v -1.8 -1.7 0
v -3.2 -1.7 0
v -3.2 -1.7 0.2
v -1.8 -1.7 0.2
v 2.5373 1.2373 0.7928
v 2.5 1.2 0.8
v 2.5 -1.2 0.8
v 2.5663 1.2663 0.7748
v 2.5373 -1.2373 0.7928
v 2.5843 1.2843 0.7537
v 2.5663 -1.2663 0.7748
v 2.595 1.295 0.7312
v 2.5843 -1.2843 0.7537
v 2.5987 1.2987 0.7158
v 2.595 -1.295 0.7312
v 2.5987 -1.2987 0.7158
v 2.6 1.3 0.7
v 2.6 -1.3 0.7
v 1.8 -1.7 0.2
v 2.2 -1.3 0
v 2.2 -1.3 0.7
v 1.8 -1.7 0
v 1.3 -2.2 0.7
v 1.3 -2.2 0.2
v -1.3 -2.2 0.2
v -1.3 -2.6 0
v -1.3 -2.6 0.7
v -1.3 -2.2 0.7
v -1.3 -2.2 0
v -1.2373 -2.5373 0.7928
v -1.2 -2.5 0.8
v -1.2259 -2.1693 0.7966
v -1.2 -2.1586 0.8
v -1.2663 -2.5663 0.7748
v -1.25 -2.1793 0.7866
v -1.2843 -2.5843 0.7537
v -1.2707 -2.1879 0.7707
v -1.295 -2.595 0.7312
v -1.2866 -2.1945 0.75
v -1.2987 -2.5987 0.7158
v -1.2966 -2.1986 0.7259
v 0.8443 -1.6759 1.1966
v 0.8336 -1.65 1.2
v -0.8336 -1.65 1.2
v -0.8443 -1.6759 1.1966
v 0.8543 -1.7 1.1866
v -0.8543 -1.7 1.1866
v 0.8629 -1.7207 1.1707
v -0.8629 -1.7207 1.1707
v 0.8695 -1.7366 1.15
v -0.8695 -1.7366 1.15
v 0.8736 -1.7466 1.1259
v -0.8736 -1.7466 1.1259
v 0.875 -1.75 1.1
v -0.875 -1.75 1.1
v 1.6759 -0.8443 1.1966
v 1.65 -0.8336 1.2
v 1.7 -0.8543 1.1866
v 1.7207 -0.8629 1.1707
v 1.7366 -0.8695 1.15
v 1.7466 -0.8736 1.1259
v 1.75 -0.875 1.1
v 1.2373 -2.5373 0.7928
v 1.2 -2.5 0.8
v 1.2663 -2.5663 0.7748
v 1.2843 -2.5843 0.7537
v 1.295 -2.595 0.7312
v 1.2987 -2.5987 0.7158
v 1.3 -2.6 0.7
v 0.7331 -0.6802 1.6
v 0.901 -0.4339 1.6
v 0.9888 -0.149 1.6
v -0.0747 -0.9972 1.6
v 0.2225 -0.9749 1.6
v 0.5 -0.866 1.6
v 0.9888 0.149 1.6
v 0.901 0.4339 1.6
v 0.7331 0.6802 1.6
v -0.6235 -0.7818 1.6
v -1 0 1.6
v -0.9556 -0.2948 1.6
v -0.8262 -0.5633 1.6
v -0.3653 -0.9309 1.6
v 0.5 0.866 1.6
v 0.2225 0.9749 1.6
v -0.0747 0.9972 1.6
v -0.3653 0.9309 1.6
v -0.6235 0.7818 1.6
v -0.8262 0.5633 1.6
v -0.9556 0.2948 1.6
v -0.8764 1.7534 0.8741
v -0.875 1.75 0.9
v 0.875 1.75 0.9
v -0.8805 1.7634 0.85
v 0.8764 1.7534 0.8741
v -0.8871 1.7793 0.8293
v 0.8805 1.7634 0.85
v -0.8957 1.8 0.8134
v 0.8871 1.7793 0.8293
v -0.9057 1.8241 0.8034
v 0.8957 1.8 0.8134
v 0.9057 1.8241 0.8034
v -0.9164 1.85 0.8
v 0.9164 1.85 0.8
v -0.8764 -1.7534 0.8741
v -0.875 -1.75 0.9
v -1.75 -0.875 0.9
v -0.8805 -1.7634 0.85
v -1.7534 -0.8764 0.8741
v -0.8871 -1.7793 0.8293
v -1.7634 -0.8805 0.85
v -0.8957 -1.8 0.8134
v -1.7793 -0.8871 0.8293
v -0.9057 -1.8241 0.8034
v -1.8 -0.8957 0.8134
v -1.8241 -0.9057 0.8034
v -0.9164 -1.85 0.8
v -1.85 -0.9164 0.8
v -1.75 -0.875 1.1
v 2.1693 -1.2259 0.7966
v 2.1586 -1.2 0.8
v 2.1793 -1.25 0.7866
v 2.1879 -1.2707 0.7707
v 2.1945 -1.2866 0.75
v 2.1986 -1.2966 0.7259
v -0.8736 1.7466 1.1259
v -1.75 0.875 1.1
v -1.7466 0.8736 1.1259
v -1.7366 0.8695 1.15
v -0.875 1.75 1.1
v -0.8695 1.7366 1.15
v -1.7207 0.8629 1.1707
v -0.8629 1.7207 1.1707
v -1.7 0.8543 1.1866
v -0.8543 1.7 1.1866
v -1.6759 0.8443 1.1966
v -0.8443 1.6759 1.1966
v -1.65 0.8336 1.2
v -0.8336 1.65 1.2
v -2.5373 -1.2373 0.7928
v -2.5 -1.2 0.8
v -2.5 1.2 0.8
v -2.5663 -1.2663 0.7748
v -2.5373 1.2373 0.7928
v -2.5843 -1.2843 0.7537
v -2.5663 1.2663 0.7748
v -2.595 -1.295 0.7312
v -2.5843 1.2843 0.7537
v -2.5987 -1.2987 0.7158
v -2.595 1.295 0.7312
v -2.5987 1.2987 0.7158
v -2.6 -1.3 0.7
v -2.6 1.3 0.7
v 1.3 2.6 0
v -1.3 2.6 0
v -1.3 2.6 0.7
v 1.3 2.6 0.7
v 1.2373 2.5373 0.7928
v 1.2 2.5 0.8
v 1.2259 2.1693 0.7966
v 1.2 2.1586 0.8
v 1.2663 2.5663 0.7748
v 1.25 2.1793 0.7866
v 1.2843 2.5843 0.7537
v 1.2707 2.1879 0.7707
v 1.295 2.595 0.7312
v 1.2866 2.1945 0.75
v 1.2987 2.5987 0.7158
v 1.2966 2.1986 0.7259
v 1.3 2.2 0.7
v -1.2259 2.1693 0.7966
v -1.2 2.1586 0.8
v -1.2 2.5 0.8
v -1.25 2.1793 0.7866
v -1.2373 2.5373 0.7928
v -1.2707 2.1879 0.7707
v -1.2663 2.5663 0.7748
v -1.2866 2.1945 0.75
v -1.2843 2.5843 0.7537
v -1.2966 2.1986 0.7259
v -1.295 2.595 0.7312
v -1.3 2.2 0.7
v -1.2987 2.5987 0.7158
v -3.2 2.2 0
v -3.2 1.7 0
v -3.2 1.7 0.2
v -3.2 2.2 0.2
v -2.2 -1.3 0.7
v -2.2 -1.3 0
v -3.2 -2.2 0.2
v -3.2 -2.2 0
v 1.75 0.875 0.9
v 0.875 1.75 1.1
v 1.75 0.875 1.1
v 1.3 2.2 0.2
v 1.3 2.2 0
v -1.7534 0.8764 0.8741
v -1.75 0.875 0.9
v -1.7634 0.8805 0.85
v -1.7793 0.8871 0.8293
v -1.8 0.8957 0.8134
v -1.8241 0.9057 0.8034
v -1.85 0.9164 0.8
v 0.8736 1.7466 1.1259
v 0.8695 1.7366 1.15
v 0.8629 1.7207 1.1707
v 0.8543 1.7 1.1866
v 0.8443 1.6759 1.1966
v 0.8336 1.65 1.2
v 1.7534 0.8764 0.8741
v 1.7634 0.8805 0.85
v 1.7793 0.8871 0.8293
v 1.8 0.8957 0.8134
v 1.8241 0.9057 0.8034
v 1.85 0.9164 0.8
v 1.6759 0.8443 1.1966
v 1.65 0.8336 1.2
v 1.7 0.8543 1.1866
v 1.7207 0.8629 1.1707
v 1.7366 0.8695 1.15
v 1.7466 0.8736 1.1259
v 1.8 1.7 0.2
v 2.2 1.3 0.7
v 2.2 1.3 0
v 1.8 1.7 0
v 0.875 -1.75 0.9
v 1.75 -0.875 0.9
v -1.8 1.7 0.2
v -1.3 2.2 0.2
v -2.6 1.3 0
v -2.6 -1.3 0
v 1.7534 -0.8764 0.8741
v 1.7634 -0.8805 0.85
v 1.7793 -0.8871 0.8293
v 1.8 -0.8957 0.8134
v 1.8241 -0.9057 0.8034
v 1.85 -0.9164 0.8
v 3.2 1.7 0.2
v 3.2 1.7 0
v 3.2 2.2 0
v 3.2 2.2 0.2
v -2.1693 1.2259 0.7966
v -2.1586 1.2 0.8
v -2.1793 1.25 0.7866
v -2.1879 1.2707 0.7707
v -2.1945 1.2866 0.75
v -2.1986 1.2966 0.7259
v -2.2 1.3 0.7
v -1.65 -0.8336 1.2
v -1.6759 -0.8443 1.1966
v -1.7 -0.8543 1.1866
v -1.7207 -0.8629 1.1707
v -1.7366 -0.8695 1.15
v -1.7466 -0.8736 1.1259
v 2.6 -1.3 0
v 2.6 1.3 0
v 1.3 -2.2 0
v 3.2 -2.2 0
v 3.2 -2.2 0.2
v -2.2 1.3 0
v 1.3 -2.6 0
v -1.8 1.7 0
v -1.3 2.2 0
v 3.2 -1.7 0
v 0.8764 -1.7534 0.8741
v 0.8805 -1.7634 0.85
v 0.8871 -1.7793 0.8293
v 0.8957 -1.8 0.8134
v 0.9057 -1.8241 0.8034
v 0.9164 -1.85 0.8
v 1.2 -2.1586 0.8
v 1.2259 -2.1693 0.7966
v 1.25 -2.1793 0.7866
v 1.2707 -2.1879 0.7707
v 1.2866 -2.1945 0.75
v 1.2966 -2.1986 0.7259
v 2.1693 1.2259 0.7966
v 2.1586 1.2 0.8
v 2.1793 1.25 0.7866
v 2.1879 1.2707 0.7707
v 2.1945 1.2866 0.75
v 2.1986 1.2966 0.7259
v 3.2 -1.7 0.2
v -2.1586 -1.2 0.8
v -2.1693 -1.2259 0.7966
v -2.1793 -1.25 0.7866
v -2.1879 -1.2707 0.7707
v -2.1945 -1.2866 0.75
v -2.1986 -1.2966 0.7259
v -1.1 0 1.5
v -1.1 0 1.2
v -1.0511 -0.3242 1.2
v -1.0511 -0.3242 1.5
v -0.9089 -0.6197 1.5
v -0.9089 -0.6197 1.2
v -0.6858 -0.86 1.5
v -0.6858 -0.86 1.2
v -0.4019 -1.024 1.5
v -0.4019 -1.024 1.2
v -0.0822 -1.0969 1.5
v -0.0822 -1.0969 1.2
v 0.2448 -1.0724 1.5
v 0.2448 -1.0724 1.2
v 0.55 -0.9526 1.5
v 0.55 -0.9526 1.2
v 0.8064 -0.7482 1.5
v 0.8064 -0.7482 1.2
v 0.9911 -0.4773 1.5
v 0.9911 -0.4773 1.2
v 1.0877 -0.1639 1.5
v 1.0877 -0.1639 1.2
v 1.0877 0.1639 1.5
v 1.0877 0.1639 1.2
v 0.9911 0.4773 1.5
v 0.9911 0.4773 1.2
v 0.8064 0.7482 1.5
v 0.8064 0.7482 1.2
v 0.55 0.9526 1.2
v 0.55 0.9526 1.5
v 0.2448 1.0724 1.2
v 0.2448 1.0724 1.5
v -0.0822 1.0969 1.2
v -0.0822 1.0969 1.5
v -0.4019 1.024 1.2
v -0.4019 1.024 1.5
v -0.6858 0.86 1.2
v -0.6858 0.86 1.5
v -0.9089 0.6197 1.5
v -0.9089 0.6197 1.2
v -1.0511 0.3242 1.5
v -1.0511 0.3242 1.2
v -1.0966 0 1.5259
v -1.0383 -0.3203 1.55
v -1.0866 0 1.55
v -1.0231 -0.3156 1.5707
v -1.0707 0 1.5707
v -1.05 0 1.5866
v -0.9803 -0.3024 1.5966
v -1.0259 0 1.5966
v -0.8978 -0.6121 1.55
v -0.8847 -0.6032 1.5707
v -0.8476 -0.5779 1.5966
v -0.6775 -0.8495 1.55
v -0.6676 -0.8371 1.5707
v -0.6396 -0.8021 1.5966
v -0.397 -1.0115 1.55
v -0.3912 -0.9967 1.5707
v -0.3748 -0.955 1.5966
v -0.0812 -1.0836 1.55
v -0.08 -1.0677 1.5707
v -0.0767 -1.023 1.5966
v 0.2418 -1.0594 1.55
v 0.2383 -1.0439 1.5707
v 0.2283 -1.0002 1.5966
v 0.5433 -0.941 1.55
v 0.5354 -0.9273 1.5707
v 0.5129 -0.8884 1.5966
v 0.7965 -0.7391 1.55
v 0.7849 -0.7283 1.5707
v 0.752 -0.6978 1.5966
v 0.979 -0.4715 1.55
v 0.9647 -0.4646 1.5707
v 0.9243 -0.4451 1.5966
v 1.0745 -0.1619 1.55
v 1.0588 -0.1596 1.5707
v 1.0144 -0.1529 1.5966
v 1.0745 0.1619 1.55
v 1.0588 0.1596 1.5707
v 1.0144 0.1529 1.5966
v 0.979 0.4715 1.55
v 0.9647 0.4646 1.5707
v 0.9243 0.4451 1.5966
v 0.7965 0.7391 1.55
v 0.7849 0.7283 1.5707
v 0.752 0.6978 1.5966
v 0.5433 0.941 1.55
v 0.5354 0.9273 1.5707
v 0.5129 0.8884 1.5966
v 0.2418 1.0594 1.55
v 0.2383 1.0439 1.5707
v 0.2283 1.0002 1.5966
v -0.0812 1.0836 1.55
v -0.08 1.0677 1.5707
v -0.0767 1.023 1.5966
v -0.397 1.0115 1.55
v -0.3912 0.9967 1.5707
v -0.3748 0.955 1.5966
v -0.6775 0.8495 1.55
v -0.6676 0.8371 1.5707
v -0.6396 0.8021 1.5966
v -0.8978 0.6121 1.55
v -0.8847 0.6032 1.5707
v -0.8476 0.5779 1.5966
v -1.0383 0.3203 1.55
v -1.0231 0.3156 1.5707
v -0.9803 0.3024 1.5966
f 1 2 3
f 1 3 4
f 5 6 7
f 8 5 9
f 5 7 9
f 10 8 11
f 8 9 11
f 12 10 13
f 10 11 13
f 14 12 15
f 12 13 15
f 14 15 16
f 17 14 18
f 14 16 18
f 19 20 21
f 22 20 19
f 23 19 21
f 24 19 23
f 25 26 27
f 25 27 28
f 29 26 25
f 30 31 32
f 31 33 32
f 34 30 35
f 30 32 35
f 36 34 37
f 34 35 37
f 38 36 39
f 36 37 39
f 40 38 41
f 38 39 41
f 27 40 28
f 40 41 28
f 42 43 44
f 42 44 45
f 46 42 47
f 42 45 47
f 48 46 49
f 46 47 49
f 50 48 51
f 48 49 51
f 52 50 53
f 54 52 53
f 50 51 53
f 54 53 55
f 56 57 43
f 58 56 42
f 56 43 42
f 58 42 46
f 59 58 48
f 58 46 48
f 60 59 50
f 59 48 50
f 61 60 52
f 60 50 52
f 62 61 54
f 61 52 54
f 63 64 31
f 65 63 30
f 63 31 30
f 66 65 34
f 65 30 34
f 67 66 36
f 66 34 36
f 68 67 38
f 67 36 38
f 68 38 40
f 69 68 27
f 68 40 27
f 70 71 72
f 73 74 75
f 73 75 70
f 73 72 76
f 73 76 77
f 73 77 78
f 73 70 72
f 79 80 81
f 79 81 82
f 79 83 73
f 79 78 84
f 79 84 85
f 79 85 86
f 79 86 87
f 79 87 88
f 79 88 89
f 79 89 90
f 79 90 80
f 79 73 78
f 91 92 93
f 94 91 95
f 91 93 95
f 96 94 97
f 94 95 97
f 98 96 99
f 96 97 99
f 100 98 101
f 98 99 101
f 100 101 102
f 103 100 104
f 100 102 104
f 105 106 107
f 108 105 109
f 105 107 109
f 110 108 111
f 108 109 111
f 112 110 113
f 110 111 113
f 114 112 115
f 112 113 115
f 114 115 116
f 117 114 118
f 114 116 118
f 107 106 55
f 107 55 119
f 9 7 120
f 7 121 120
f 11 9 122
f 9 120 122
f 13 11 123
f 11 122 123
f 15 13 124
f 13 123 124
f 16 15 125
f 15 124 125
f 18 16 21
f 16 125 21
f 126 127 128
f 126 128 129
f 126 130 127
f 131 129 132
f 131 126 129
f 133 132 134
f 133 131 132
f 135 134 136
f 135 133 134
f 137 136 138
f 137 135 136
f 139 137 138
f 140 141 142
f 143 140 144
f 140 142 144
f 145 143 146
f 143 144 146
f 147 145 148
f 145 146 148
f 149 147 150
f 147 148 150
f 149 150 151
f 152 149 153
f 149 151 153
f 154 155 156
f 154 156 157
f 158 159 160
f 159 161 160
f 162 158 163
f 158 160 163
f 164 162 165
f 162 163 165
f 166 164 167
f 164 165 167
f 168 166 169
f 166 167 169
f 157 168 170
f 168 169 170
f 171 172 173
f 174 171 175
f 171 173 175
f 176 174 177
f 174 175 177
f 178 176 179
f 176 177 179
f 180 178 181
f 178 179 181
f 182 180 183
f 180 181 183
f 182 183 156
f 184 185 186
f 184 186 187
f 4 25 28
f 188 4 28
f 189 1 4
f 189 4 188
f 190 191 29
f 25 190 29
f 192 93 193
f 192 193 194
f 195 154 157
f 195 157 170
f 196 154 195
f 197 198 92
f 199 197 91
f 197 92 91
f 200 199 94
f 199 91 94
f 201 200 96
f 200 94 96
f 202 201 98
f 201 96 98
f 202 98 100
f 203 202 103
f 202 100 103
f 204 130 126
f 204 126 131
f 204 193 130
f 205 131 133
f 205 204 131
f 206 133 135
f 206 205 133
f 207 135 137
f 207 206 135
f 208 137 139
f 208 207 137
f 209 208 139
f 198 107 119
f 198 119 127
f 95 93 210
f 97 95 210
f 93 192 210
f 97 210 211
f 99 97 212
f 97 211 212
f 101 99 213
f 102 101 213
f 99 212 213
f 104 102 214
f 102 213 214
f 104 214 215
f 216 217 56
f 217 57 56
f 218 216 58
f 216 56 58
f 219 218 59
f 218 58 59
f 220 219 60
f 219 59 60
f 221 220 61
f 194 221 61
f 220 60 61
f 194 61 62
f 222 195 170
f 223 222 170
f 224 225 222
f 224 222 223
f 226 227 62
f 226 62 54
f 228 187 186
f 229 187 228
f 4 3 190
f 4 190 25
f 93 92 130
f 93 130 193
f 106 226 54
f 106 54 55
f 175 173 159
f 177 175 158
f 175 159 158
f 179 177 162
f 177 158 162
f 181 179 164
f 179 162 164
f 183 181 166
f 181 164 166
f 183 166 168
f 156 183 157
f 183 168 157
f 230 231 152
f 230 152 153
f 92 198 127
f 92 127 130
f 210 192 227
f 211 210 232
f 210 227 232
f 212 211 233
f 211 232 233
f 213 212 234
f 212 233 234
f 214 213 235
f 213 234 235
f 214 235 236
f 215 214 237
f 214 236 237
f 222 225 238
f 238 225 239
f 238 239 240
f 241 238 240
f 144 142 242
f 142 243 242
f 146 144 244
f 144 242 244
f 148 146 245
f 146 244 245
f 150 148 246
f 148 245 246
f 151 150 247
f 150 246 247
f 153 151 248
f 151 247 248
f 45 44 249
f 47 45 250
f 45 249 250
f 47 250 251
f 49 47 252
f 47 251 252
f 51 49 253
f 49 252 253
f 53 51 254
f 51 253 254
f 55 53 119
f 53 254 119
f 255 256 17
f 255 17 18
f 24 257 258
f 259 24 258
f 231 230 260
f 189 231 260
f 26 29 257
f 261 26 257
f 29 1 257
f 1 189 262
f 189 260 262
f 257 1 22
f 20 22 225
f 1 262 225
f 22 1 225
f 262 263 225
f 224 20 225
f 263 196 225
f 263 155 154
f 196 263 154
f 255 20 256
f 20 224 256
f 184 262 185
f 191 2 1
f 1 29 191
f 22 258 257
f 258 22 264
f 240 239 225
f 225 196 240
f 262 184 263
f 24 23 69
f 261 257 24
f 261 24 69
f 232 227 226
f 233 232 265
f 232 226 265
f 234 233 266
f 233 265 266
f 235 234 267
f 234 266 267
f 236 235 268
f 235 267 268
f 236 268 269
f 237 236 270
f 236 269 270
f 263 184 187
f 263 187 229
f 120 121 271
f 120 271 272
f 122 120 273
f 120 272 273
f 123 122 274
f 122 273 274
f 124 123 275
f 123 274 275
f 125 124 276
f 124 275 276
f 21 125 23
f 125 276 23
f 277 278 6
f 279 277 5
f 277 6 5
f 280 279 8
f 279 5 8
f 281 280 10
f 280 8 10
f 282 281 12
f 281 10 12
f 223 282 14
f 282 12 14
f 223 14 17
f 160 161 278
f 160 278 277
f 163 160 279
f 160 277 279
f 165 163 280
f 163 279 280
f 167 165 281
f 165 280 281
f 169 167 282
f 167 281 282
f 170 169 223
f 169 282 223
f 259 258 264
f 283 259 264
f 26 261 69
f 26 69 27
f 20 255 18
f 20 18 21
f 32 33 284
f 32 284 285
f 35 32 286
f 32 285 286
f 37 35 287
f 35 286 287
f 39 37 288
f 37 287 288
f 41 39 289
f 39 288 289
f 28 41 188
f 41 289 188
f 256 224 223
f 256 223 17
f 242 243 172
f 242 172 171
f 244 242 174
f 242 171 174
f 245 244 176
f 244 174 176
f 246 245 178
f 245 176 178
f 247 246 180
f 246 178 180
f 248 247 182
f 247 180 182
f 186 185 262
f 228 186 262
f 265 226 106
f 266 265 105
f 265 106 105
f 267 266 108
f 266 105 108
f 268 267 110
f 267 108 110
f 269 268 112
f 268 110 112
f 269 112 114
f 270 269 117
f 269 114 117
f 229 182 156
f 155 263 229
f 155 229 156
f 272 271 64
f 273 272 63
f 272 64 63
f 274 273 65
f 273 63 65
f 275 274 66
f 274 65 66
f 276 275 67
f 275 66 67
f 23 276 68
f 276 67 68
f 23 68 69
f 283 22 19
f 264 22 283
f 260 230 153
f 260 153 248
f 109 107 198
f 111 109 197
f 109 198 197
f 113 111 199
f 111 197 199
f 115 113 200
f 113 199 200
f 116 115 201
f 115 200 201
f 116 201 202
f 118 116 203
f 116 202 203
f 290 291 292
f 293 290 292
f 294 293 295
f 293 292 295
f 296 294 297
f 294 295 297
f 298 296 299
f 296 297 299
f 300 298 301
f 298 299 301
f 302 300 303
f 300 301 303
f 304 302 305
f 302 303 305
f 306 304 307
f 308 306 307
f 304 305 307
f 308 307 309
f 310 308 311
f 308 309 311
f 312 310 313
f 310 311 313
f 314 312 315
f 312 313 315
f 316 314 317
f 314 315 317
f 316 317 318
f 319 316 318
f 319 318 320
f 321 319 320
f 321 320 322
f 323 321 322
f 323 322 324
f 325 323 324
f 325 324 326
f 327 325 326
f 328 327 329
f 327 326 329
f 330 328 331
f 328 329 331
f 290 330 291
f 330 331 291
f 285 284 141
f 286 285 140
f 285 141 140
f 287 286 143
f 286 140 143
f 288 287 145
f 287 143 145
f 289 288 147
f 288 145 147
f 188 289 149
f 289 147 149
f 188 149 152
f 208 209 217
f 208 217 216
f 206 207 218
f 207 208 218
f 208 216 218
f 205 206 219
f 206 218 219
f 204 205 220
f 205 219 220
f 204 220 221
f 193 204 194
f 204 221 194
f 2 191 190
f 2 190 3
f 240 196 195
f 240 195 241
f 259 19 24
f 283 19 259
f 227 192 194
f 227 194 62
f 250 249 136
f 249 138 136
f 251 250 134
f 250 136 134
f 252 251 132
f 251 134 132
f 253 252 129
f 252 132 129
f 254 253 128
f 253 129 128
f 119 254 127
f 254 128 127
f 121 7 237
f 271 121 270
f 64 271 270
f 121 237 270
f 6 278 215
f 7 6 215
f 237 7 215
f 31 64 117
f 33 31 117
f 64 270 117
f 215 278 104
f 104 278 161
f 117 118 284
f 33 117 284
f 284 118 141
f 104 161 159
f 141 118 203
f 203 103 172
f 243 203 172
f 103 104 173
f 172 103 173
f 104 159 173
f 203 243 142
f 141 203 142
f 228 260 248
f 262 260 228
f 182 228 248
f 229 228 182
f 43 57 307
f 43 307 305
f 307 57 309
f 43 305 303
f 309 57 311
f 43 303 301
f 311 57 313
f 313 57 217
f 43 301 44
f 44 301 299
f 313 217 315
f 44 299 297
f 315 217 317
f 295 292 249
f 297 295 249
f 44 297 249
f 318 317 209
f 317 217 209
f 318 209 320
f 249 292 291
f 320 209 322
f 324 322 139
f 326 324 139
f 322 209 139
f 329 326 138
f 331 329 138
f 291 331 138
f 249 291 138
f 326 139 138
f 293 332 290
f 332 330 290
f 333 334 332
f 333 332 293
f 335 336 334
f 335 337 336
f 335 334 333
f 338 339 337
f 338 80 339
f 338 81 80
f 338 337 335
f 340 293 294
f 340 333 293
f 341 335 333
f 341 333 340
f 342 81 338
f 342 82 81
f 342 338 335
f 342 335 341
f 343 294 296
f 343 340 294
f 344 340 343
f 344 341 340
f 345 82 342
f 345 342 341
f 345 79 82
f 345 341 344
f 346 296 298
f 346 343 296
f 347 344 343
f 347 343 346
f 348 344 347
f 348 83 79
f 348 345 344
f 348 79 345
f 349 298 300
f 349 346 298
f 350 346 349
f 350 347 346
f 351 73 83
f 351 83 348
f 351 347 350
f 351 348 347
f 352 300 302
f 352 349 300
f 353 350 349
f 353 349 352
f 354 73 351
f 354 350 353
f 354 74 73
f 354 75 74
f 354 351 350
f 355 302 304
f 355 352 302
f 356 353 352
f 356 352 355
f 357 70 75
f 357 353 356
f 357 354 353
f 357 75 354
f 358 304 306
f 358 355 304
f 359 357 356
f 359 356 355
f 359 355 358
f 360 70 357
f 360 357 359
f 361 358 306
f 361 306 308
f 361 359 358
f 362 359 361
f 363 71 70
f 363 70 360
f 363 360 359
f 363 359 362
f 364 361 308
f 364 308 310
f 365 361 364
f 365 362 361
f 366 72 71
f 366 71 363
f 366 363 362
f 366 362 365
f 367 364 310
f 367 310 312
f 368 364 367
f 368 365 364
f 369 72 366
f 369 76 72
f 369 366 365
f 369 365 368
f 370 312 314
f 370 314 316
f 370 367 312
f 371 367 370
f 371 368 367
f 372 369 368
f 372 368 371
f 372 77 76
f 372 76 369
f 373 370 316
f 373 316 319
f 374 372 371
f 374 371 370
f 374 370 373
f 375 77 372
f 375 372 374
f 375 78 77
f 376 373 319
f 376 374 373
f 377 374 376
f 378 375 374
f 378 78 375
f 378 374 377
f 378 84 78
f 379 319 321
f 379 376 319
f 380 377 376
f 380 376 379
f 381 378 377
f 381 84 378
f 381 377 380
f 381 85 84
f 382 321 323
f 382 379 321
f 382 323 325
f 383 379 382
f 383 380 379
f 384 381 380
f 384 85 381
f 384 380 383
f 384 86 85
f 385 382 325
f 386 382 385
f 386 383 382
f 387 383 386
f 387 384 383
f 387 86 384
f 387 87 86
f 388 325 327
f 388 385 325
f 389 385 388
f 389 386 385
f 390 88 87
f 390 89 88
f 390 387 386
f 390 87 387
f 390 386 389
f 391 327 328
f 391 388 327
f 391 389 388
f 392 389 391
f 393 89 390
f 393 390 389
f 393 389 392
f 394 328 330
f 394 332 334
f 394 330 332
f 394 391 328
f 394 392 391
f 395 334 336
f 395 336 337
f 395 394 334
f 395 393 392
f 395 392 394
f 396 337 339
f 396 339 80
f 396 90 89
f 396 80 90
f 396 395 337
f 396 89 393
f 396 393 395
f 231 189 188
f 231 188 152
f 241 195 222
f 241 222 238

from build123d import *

# Parameters (mm, degrees)
BOSS_EXTRUDE1_DEPTH = 0.8
SKETCH3_W           = 6.4
SKETCH3_H           = 0.5
BOSS_EXTRUDE2_DEPTH = 0.2
BOSS_EXTRUDE3_DEPTH = 0.4
SKETCH5_R           = 1.1
BOSS_EXTRUDE4_DEPTH = 0.4
FILLET2_R           = 0.1
FILLET3_R           = 0.1
FILLET4_R           = 0.1


with BuildPart() as part:
    # Sketch1 → Boss-Extrude1 (new body)
    with BuildSketch(Plane.XY):
        Polygon((-1.3, 2.6), (1.3, 2.6), (1.3, 2.2), (2.2, 1.3), (2.6, 1.3), (2.6, -1.3), (2.2, -1.3), (1.3, -2.2), (1.3, -2.6), (-1.3, -2.6), (-1.3, -2.2), (-2.2, -1.3), (-2.6, -1.3), (-2.6, 1.3), (-2.2, 1.3), (-1.3, 2.2), align=None)
    extrude(amount=BOSS_EXTRUDE1_DEPTH)

    # Sketch3 → Boss-Extrude2 (add)
    with BuildSketch(Plane.XY):
        with Locations((0, 1.95)):
            Rectangle(SKETCH3_W, SKETCH3_H)
        with Locations((0, -1.95)):
            Rectangle(SKETCH3_W, SKETCH3_H)
    extrude(amount=BOSS_EXTRUDE2_DEPTH)

    # Sketch4 → Boss-Extrude3 (add)
    with BuildSketch(Plane.XY.offset(0.8)):
        Polygon((-0.875, 1.75), (0.875, 1.75), (1.75, 0.875), (1.75, -0.875), (0.875, -1.75), (-0.875, -1.75), (-1.75, -0.875), (-1.75, 0.875), align=None)
    extrude(amount=BOSS_EXTRUDE3_DEPTH)

    # Sketch5 → Boss-Extrude4 (add)
    with BuildSketch(Plane.XY.offset(1.2)):
        with Locations(Location((0, 0, 0), (0, 0, 180))):
            Circle(SKETCH5_R)
    extrude(amount=BOSS_EXTRUDE4_DEPTH)

    # Fillet2
    fillet2_edges = [part.edges().sort_by_distance(p)[0] for p in [
        (1.1, 0, 1.6),
    ]]
    fillet(fillet2_edges, radius=FILLET2_R)

    # Fillet3
    fillet3_edges = [part.edges().sort_by_distance(p)[0] for p in [
        (1.3, 2.4, 0.8),
        (0, 2.6, 0.8),
        (-1.3, 2.4, 0.8),
        (-1.75, 1.75, 0.8),
        (-2.4, 1.3, 0.8),
        (-2.6, 0, 0.8),
        (-2.4, -1.3, 0.8),
        (-1.75, -1.75, 0.8),
        (-1.3, -2.4, 0.8),
        (0, -2.6, 0.8),
        (2.4, 1.3, 0.8),
        (1.3, -2.4, 0.8),
        (1.75, -1.75, 0.8),
        (2.4, -1.3, 0.8),
        (2.6, 0, 0.8),
        (1.75, 1.75, 0.8),
        (1.3125, 1.3125, 0.8),
        (0, 1.75, 0.8),
        (-1.3125, 1.3125, 0.8),
        (-1.75, 0, 0.8),
        (-1.3125, -1.3125, 0.8),
        (0, -1.75, 0.8),
        (1.3125, -1.3125, 0.8),
        (1.75, 0, 0.8),
    ]]
    fillet(fillet3_edges, radius=FILLET3_R)

    # Fillet4
    fillet4_edges = [part.edges().sort_by_distance(p)[0] for p in [
        (0, 1.75, 1.2),
        (-1.3125, 1.3125, 1.2),
        (-1.75, 0, 1.2),
        (-1.3125, -1.3125, 1.2),
        (0, -1.75, 1.2),
        (1.3125, -1.3125, 1.2),
        (1.75, 0, 1.2),
        (1.3125, 1.3125, 1.2),
    ]]
    fillet(fillet4_edges, radius=FILLET4_R)


solid = part.part
